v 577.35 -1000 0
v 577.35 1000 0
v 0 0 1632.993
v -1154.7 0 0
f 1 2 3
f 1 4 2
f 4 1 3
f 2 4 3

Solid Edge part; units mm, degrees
sketch "Sketch1" plane through (0, 0, 0) normal (0, 0, 1) x (1, 0, 0)
  line L0 (-1154.7005, 0) -> (577.3503, -1000)
  line L1 (577.3503, -1000) -> (577.3503, 1000)
  line L2 (577.3503, 1000) -> (-1154.7005, 0)
extrude "Protrusion1" add sketch "Sketch1" along normal up to vertex (2000 mm away)
sketch "Sketch2" plane through (0, 0, 0) normal (0, -1, 0) x (1, 0, 0)
  line L0 (577.3503, 0) -> (0, 1632.9932)
extrude "Cutout1" cut sketch "Sketch2" along normal mid plane 2000 material side at (288.7223, 0, 816.5133)
pattern_circular "Pattern1" count 3 over 360 about axis through (0, 0, 2000) along (0, 0, -1) of "Cutout1"
